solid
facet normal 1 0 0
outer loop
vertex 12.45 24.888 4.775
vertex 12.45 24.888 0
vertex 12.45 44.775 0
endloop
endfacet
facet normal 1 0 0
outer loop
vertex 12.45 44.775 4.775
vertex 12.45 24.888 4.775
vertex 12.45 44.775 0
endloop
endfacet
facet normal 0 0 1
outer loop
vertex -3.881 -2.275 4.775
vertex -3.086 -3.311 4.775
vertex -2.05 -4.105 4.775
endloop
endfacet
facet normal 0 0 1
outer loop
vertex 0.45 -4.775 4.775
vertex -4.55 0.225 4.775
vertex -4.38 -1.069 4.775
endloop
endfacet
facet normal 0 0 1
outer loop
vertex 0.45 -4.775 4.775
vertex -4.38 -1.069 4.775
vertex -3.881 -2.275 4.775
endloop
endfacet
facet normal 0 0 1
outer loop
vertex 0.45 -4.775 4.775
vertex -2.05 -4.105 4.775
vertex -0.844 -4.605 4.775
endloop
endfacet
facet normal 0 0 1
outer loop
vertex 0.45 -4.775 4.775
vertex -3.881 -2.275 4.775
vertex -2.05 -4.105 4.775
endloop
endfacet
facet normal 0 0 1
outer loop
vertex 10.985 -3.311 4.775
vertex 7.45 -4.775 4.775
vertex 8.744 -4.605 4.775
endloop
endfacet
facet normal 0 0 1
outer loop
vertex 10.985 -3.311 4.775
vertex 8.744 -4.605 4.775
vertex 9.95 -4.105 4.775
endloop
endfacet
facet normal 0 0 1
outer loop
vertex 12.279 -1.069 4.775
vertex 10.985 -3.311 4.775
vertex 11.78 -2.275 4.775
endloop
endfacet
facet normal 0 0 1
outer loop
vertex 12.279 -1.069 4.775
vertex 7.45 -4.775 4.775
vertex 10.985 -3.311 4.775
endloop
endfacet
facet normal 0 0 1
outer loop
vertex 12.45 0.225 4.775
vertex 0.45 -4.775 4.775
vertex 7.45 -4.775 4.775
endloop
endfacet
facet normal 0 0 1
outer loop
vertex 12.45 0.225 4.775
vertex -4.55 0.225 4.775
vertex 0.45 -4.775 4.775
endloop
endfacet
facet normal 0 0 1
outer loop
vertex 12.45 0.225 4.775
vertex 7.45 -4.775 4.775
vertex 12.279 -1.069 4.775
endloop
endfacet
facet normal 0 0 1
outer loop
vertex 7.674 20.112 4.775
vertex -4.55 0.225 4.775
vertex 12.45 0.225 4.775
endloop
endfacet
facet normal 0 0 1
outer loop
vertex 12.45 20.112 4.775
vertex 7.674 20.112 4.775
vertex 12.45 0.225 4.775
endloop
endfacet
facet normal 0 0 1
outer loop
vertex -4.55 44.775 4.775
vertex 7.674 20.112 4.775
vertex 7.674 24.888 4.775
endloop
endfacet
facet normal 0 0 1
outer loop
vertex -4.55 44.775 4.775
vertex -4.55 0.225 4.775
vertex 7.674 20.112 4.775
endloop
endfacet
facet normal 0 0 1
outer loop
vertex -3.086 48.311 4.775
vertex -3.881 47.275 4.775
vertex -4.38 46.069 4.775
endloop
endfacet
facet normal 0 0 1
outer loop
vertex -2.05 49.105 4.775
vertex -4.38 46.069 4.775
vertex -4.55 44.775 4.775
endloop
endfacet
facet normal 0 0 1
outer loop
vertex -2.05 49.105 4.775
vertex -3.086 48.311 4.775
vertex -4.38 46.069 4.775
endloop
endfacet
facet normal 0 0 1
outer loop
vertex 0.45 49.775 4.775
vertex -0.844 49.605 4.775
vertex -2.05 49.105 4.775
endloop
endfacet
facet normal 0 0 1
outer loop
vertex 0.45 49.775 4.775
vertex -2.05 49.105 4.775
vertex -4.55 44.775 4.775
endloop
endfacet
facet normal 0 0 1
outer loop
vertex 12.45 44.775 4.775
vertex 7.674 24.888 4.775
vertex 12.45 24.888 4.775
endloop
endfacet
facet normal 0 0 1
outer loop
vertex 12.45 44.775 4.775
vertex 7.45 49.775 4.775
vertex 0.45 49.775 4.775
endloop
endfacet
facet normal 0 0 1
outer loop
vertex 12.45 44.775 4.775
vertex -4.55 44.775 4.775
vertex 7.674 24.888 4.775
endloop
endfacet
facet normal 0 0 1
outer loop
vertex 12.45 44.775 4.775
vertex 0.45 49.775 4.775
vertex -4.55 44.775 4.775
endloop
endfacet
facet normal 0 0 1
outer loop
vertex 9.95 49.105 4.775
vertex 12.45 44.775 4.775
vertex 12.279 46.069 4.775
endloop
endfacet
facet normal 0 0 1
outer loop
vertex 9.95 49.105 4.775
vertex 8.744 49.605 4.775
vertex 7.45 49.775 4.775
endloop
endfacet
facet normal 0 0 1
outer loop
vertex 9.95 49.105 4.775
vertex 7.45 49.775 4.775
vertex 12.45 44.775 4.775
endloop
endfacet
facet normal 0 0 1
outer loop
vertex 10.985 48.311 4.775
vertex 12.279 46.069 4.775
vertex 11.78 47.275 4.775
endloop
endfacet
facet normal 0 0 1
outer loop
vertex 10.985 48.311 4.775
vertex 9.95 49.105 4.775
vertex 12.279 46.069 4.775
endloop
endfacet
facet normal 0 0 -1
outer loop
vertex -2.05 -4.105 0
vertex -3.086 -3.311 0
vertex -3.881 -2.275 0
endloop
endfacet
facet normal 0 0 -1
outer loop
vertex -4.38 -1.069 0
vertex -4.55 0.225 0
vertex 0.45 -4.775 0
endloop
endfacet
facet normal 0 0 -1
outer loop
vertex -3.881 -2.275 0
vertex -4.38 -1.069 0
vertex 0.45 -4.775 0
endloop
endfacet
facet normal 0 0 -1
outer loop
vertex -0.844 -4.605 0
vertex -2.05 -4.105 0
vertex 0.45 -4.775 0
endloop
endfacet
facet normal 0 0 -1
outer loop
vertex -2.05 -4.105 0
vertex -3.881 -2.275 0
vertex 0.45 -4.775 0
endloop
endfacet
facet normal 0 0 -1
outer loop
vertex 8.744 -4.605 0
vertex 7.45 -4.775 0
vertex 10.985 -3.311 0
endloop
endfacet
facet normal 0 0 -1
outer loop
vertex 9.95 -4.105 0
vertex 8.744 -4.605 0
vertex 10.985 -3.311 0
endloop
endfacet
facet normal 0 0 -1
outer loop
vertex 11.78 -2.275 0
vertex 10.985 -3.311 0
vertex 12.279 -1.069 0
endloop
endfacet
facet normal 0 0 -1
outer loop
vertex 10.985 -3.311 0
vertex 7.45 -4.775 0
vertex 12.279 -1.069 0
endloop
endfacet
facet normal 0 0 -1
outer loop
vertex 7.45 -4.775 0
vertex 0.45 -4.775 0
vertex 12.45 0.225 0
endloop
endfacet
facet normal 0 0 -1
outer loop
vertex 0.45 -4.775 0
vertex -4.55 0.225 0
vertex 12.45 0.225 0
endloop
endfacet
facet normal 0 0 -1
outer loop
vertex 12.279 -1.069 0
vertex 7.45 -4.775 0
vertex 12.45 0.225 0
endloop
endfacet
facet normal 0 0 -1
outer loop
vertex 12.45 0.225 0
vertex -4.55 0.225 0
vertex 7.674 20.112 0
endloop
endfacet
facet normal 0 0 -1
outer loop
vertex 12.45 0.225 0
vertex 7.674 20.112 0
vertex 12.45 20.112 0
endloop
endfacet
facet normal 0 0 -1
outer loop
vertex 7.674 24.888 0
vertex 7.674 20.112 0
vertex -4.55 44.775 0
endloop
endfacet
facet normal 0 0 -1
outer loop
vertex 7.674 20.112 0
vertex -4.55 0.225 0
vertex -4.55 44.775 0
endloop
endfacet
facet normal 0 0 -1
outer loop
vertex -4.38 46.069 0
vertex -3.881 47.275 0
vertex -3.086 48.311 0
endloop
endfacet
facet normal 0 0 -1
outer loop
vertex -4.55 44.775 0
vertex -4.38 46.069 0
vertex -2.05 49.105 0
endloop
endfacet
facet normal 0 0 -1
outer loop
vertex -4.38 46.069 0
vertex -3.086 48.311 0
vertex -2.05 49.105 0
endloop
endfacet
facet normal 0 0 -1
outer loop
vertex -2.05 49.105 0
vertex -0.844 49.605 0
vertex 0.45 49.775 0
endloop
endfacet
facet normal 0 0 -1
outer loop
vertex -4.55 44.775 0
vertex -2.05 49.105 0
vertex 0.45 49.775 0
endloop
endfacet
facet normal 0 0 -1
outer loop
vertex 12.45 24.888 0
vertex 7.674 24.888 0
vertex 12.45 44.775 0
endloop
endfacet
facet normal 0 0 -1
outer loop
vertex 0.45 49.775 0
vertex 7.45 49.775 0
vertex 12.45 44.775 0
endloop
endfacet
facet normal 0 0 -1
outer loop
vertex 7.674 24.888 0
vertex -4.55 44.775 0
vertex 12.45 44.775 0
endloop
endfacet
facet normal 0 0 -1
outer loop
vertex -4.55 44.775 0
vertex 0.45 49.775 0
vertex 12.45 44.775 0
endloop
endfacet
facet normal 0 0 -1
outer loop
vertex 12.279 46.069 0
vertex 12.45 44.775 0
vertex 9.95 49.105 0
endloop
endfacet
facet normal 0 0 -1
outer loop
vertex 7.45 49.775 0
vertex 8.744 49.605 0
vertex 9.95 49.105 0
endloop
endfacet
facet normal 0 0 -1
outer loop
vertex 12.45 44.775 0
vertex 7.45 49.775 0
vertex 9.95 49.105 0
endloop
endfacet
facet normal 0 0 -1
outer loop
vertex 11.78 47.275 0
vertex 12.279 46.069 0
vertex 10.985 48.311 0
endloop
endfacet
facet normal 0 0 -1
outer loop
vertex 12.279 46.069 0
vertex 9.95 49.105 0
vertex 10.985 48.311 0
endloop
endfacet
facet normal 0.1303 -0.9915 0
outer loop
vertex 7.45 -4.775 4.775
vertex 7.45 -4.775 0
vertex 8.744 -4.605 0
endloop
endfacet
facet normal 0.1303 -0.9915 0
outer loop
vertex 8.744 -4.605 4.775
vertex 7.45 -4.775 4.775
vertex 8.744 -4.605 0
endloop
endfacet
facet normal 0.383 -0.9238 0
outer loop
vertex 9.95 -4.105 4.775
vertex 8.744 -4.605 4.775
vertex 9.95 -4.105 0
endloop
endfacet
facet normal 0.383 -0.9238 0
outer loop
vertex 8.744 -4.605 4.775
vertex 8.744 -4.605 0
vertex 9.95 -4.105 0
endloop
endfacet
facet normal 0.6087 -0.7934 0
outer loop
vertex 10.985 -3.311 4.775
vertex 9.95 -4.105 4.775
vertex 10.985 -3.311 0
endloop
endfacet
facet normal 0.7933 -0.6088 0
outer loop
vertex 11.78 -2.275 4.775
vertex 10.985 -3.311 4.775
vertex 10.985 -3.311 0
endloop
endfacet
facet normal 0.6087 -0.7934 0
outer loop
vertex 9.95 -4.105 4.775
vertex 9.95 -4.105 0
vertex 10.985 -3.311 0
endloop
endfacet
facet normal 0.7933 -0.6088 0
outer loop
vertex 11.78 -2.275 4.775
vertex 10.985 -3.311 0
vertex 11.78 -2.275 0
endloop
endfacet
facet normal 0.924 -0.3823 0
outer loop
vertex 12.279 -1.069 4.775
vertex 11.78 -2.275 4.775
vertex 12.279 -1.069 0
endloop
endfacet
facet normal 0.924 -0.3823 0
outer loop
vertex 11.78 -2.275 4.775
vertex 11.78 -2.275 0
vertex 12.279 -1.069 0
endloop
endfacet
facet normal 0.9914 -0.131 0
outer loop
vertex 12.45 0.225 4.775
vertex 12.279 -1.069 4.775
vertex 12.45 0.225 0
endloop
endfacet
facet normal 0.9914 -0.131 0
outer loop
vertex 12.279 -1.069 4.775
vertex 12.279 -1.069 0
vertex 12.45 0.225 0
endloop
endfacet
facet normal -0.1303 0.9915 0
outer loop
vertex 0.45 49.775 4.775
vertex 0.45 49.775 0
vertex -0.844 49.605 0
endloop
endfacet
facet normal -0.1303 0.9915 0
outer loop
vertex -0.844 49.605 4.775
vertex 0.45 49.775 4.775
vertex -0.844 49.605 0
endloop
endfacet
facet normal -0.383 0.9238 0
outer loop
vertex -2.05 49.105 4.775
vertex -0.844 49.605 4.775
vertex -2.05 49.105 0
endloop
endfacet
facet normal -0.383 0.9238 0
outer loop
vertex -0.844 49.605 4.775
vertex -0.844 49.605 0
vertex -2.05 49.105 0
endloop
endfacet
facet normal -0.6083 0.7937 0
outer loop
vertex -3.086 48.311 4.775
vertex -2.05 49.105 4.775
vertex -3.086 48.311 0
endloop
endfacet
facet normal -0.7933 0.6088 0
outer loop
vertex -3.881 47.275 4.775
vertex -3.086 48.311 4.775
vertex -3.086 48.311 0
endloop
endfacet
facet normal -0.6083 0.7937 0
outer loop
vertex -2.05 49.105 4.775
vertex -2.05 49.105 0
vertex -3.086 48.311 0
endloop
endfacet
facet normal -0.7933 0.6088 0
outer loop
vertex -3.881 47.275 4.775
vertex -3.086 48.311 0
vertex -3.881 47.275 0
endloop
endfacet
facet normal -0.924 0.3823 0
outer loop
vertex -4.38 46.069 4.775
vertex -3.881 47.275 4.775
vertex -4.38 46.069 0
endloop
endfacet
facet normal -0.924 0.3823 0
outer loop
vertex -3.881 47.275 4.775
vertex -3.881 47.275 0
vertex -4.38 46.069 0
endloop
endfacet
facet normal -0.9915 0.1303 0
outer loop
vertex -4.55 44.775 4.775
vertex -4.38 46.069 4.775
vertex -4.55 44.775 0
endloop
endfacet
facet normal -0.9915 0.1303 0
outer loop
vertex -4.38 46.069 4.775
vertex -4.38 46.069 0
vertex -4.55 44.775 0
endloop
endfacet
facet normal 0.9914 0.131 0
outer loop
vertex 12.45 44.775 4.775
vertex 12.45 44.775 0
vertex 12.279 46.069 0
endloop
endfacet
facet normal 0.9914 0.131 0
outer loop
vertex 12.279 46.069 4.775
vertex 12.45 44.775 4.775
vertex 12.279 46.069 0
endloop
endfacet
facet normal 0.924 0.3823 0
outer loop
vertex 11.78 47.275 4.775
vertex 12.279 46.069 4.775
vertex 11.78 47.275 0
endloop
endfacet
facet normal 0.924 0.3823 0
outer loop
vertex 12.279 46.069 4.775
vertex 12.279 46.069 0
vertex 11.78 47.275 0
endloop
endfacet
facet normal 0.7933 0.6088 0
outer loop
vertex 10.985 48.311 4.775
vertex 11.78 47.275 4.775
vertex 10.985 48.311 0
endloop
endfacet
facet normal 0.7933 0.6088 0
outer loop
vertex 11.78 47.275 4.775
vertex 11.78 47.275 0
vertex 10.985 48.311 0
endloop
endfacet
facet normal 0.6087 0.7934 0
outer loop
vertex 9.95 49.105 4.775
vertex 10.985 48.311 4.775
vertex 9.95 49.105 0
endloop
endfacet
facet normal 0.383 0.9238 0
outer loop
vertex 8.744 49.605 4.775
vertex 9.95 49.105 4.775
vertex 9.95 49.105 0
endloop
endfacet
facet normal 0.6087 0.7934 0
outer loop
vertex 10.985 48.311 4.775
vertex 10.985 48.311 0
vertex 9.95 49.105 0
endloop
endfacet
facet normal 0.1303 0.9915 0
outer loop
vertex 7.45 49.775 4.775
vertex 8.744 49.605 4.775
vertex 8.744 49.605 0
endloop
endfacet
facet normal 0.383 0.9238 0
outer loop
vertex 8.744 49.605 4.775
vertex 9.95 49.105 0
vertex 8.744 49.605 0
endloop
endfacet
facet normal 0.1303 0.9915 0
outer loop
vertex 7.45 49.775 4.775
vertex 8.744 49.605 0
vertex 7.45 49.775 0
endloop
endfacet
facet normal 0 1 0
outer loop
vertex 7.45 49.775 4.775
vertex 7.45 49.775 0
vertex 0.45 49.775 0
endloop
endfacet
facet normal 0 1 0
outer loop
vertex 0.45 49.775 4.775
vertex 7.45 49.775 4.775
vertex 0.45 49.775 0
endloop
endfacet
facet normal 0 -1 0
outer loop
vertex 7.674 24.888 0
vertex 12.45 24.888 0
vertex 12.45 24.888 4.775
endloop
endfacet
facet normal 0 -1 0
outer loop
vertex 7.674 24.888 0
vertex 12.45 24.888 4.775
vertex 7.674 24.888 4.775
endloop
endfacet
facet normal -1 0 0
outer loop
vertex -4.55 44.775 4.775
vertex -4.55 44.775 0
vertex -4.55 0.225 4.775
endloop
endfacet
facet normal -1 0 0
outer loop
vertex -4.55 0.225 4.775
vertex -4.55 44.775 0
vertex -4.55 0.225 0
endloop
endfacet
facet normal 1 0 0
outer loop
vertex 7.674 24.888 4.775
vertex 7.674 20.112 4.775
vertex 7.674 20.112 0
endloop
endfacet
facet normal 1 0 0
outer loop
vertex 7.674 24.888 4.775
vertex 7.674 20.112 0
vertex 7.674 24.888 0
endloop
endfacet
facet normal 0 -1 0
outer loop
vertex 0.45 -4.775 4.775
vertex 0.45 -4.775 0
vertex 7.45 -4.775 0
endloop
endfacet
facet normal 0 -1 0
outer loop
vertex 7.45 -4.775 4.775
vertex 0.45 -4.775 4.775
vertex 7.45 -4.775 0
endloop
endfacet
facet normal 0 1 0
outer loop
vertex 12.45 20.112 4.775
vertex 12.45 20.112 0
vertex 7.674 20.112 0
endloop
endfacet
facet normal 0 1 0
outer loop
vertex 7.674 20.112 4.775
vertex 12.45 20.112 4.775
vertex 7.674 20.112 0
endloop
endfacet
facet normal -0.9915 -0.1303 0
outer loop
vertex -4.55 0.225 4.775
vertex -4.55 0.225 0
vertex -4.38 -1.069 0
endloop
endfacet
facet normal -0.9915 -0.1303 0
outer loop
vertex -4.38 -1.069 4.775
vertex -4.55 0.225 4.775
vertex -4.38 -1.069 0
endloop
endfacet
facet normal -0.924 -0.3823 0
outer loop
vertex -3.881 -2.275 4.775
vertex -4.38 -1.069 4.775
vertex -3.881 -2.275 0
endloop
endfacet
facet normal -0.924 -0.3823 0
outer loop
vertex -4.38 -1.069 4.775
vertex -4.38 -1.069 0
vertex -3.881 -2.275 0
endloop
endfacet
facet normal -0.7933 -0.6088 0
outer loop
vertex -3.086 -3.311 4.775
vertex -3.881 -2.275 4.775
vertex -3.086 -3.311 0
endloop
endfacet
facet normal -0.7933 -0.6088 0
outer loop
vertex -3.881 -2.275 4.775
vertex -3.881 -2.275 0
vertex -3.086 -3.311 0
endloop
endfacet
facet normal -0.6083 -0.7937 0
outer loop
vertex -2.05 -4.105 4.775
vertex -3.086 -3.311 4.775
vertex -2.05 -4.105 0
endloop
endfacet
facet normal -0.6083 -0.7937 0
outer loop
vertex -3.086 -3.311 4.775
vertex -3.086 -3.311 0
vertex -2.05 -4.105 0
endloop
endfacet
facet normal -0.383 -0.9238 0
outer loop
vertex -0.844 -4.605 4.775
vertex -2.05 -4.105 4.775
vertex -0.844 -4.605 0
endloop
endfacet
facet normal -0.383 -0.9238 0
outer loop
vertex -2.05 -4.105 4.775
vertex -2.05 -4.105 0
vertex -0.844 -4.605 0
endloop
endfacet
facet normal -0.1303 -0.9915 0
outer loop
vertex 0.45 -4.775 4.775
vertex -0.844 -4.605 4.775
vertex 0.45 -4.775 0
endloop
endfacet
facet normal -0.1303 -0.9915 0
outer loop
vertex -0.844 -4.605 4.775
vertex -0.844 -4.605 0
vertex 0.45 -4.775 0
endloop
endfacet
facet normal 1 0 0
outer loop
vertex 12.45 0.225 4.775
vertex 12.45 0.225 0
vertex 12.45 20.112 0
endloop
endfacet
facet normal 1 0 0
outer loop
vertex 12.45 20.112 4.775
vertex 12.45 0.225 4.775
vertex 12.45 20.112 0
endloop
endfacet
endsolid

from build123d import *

# Parameters (mm, degrees)
BOSS_EXTRUDE1_DEPTH = 4.7752
SKETCH2_W           = 4.7752
SKETCH2_H           = 4.7752
CUT_EXTRUDE1_DEPTH  = 4.7752


with BuildPart() as part:
    # Sketch1 → Boss-Extrude1 (new body)
    with BuildSketch(Plane.XY):
        with BuildLine():
            Line((-4.5504, 44.7752), (-4.5504, 0.2248))
            ThreePointArc((-4.5504, 0.2248), (-3.085933906, -3.310733906), (0.4496, -4.7752))
            Line((0.4496, -4.7752), (7.4496, -4.7752))
            ThreePointArc((7.4496, -4.7752), (10.985133906, -3.310733906), (12.4496, 0.2248))
            Line((12.4496, 0.2248), (12.4496, 44.7752))
            ThreePointArc((12.4496, 44.7752), (10.985133906, 48.310733906), (7.4496, 49.7752))
            Line((7.4496, 49.7752), (0.4496, 49.7752))
            ThreePointArc((0.4496, 49.7752), (-3.085933906, 48.310733906), (-4.5504, 44.7752))
        make_face()
    extrude(amount=BOSS_EXTRUDE1_DEPTH)

    # Sketch2 → Cut-Extrude1 (cut)
    with BuildSketch(Plane(origin=(0, 0, 0), x_dir=(-1, 0, 0), z_dir=(0, 0, -1))):
        with Locations((-10.062, 22.5)):
            Rectangle(SKETCH2_W, SKETCH2_H)
    extrude(amount=-CUT_EXTRUDE1_DEPTH, mode=Mode.SUBTRACT)


solid = part.part
